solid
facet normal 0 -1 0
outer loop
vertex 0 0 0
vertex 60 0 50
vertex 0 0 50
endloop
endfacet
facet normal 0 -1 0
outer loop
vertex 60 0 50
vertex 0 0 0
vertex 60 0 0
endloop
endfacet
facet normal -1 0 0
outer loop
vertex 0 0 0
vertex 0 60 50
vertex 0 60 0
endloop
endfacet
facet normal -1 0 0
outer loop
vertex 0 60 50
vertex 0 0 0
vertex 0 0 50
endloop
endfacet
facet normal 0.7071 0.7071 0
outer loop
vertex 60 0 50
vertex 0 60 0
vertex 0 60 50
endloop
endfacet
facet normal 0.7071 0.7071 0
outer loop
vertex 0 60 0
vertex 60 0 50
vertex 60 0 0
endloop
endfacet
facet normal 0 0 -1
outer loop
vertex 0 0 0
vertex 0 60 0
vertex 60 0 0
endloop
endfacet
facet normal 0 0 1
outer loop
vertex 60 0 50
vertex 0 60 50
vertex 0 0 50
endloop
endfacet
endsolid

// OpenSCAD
// Unit of length: Unit.MM
polyhedron(points = [[0.0, 0.0, 0.0], [0.0, 0.0, 50.0], [60.0, 0.0, 50.0], [60.0, 0.0, 0.0], [0.0, 60.0, 0.0], [0.0, 60.0, 50.0]], faces = [[0, 1, 2, 3], [4, 5, 1, 0], [3, 2, 5, 4], [3, 4, 0], [1, 5, 2]]);
